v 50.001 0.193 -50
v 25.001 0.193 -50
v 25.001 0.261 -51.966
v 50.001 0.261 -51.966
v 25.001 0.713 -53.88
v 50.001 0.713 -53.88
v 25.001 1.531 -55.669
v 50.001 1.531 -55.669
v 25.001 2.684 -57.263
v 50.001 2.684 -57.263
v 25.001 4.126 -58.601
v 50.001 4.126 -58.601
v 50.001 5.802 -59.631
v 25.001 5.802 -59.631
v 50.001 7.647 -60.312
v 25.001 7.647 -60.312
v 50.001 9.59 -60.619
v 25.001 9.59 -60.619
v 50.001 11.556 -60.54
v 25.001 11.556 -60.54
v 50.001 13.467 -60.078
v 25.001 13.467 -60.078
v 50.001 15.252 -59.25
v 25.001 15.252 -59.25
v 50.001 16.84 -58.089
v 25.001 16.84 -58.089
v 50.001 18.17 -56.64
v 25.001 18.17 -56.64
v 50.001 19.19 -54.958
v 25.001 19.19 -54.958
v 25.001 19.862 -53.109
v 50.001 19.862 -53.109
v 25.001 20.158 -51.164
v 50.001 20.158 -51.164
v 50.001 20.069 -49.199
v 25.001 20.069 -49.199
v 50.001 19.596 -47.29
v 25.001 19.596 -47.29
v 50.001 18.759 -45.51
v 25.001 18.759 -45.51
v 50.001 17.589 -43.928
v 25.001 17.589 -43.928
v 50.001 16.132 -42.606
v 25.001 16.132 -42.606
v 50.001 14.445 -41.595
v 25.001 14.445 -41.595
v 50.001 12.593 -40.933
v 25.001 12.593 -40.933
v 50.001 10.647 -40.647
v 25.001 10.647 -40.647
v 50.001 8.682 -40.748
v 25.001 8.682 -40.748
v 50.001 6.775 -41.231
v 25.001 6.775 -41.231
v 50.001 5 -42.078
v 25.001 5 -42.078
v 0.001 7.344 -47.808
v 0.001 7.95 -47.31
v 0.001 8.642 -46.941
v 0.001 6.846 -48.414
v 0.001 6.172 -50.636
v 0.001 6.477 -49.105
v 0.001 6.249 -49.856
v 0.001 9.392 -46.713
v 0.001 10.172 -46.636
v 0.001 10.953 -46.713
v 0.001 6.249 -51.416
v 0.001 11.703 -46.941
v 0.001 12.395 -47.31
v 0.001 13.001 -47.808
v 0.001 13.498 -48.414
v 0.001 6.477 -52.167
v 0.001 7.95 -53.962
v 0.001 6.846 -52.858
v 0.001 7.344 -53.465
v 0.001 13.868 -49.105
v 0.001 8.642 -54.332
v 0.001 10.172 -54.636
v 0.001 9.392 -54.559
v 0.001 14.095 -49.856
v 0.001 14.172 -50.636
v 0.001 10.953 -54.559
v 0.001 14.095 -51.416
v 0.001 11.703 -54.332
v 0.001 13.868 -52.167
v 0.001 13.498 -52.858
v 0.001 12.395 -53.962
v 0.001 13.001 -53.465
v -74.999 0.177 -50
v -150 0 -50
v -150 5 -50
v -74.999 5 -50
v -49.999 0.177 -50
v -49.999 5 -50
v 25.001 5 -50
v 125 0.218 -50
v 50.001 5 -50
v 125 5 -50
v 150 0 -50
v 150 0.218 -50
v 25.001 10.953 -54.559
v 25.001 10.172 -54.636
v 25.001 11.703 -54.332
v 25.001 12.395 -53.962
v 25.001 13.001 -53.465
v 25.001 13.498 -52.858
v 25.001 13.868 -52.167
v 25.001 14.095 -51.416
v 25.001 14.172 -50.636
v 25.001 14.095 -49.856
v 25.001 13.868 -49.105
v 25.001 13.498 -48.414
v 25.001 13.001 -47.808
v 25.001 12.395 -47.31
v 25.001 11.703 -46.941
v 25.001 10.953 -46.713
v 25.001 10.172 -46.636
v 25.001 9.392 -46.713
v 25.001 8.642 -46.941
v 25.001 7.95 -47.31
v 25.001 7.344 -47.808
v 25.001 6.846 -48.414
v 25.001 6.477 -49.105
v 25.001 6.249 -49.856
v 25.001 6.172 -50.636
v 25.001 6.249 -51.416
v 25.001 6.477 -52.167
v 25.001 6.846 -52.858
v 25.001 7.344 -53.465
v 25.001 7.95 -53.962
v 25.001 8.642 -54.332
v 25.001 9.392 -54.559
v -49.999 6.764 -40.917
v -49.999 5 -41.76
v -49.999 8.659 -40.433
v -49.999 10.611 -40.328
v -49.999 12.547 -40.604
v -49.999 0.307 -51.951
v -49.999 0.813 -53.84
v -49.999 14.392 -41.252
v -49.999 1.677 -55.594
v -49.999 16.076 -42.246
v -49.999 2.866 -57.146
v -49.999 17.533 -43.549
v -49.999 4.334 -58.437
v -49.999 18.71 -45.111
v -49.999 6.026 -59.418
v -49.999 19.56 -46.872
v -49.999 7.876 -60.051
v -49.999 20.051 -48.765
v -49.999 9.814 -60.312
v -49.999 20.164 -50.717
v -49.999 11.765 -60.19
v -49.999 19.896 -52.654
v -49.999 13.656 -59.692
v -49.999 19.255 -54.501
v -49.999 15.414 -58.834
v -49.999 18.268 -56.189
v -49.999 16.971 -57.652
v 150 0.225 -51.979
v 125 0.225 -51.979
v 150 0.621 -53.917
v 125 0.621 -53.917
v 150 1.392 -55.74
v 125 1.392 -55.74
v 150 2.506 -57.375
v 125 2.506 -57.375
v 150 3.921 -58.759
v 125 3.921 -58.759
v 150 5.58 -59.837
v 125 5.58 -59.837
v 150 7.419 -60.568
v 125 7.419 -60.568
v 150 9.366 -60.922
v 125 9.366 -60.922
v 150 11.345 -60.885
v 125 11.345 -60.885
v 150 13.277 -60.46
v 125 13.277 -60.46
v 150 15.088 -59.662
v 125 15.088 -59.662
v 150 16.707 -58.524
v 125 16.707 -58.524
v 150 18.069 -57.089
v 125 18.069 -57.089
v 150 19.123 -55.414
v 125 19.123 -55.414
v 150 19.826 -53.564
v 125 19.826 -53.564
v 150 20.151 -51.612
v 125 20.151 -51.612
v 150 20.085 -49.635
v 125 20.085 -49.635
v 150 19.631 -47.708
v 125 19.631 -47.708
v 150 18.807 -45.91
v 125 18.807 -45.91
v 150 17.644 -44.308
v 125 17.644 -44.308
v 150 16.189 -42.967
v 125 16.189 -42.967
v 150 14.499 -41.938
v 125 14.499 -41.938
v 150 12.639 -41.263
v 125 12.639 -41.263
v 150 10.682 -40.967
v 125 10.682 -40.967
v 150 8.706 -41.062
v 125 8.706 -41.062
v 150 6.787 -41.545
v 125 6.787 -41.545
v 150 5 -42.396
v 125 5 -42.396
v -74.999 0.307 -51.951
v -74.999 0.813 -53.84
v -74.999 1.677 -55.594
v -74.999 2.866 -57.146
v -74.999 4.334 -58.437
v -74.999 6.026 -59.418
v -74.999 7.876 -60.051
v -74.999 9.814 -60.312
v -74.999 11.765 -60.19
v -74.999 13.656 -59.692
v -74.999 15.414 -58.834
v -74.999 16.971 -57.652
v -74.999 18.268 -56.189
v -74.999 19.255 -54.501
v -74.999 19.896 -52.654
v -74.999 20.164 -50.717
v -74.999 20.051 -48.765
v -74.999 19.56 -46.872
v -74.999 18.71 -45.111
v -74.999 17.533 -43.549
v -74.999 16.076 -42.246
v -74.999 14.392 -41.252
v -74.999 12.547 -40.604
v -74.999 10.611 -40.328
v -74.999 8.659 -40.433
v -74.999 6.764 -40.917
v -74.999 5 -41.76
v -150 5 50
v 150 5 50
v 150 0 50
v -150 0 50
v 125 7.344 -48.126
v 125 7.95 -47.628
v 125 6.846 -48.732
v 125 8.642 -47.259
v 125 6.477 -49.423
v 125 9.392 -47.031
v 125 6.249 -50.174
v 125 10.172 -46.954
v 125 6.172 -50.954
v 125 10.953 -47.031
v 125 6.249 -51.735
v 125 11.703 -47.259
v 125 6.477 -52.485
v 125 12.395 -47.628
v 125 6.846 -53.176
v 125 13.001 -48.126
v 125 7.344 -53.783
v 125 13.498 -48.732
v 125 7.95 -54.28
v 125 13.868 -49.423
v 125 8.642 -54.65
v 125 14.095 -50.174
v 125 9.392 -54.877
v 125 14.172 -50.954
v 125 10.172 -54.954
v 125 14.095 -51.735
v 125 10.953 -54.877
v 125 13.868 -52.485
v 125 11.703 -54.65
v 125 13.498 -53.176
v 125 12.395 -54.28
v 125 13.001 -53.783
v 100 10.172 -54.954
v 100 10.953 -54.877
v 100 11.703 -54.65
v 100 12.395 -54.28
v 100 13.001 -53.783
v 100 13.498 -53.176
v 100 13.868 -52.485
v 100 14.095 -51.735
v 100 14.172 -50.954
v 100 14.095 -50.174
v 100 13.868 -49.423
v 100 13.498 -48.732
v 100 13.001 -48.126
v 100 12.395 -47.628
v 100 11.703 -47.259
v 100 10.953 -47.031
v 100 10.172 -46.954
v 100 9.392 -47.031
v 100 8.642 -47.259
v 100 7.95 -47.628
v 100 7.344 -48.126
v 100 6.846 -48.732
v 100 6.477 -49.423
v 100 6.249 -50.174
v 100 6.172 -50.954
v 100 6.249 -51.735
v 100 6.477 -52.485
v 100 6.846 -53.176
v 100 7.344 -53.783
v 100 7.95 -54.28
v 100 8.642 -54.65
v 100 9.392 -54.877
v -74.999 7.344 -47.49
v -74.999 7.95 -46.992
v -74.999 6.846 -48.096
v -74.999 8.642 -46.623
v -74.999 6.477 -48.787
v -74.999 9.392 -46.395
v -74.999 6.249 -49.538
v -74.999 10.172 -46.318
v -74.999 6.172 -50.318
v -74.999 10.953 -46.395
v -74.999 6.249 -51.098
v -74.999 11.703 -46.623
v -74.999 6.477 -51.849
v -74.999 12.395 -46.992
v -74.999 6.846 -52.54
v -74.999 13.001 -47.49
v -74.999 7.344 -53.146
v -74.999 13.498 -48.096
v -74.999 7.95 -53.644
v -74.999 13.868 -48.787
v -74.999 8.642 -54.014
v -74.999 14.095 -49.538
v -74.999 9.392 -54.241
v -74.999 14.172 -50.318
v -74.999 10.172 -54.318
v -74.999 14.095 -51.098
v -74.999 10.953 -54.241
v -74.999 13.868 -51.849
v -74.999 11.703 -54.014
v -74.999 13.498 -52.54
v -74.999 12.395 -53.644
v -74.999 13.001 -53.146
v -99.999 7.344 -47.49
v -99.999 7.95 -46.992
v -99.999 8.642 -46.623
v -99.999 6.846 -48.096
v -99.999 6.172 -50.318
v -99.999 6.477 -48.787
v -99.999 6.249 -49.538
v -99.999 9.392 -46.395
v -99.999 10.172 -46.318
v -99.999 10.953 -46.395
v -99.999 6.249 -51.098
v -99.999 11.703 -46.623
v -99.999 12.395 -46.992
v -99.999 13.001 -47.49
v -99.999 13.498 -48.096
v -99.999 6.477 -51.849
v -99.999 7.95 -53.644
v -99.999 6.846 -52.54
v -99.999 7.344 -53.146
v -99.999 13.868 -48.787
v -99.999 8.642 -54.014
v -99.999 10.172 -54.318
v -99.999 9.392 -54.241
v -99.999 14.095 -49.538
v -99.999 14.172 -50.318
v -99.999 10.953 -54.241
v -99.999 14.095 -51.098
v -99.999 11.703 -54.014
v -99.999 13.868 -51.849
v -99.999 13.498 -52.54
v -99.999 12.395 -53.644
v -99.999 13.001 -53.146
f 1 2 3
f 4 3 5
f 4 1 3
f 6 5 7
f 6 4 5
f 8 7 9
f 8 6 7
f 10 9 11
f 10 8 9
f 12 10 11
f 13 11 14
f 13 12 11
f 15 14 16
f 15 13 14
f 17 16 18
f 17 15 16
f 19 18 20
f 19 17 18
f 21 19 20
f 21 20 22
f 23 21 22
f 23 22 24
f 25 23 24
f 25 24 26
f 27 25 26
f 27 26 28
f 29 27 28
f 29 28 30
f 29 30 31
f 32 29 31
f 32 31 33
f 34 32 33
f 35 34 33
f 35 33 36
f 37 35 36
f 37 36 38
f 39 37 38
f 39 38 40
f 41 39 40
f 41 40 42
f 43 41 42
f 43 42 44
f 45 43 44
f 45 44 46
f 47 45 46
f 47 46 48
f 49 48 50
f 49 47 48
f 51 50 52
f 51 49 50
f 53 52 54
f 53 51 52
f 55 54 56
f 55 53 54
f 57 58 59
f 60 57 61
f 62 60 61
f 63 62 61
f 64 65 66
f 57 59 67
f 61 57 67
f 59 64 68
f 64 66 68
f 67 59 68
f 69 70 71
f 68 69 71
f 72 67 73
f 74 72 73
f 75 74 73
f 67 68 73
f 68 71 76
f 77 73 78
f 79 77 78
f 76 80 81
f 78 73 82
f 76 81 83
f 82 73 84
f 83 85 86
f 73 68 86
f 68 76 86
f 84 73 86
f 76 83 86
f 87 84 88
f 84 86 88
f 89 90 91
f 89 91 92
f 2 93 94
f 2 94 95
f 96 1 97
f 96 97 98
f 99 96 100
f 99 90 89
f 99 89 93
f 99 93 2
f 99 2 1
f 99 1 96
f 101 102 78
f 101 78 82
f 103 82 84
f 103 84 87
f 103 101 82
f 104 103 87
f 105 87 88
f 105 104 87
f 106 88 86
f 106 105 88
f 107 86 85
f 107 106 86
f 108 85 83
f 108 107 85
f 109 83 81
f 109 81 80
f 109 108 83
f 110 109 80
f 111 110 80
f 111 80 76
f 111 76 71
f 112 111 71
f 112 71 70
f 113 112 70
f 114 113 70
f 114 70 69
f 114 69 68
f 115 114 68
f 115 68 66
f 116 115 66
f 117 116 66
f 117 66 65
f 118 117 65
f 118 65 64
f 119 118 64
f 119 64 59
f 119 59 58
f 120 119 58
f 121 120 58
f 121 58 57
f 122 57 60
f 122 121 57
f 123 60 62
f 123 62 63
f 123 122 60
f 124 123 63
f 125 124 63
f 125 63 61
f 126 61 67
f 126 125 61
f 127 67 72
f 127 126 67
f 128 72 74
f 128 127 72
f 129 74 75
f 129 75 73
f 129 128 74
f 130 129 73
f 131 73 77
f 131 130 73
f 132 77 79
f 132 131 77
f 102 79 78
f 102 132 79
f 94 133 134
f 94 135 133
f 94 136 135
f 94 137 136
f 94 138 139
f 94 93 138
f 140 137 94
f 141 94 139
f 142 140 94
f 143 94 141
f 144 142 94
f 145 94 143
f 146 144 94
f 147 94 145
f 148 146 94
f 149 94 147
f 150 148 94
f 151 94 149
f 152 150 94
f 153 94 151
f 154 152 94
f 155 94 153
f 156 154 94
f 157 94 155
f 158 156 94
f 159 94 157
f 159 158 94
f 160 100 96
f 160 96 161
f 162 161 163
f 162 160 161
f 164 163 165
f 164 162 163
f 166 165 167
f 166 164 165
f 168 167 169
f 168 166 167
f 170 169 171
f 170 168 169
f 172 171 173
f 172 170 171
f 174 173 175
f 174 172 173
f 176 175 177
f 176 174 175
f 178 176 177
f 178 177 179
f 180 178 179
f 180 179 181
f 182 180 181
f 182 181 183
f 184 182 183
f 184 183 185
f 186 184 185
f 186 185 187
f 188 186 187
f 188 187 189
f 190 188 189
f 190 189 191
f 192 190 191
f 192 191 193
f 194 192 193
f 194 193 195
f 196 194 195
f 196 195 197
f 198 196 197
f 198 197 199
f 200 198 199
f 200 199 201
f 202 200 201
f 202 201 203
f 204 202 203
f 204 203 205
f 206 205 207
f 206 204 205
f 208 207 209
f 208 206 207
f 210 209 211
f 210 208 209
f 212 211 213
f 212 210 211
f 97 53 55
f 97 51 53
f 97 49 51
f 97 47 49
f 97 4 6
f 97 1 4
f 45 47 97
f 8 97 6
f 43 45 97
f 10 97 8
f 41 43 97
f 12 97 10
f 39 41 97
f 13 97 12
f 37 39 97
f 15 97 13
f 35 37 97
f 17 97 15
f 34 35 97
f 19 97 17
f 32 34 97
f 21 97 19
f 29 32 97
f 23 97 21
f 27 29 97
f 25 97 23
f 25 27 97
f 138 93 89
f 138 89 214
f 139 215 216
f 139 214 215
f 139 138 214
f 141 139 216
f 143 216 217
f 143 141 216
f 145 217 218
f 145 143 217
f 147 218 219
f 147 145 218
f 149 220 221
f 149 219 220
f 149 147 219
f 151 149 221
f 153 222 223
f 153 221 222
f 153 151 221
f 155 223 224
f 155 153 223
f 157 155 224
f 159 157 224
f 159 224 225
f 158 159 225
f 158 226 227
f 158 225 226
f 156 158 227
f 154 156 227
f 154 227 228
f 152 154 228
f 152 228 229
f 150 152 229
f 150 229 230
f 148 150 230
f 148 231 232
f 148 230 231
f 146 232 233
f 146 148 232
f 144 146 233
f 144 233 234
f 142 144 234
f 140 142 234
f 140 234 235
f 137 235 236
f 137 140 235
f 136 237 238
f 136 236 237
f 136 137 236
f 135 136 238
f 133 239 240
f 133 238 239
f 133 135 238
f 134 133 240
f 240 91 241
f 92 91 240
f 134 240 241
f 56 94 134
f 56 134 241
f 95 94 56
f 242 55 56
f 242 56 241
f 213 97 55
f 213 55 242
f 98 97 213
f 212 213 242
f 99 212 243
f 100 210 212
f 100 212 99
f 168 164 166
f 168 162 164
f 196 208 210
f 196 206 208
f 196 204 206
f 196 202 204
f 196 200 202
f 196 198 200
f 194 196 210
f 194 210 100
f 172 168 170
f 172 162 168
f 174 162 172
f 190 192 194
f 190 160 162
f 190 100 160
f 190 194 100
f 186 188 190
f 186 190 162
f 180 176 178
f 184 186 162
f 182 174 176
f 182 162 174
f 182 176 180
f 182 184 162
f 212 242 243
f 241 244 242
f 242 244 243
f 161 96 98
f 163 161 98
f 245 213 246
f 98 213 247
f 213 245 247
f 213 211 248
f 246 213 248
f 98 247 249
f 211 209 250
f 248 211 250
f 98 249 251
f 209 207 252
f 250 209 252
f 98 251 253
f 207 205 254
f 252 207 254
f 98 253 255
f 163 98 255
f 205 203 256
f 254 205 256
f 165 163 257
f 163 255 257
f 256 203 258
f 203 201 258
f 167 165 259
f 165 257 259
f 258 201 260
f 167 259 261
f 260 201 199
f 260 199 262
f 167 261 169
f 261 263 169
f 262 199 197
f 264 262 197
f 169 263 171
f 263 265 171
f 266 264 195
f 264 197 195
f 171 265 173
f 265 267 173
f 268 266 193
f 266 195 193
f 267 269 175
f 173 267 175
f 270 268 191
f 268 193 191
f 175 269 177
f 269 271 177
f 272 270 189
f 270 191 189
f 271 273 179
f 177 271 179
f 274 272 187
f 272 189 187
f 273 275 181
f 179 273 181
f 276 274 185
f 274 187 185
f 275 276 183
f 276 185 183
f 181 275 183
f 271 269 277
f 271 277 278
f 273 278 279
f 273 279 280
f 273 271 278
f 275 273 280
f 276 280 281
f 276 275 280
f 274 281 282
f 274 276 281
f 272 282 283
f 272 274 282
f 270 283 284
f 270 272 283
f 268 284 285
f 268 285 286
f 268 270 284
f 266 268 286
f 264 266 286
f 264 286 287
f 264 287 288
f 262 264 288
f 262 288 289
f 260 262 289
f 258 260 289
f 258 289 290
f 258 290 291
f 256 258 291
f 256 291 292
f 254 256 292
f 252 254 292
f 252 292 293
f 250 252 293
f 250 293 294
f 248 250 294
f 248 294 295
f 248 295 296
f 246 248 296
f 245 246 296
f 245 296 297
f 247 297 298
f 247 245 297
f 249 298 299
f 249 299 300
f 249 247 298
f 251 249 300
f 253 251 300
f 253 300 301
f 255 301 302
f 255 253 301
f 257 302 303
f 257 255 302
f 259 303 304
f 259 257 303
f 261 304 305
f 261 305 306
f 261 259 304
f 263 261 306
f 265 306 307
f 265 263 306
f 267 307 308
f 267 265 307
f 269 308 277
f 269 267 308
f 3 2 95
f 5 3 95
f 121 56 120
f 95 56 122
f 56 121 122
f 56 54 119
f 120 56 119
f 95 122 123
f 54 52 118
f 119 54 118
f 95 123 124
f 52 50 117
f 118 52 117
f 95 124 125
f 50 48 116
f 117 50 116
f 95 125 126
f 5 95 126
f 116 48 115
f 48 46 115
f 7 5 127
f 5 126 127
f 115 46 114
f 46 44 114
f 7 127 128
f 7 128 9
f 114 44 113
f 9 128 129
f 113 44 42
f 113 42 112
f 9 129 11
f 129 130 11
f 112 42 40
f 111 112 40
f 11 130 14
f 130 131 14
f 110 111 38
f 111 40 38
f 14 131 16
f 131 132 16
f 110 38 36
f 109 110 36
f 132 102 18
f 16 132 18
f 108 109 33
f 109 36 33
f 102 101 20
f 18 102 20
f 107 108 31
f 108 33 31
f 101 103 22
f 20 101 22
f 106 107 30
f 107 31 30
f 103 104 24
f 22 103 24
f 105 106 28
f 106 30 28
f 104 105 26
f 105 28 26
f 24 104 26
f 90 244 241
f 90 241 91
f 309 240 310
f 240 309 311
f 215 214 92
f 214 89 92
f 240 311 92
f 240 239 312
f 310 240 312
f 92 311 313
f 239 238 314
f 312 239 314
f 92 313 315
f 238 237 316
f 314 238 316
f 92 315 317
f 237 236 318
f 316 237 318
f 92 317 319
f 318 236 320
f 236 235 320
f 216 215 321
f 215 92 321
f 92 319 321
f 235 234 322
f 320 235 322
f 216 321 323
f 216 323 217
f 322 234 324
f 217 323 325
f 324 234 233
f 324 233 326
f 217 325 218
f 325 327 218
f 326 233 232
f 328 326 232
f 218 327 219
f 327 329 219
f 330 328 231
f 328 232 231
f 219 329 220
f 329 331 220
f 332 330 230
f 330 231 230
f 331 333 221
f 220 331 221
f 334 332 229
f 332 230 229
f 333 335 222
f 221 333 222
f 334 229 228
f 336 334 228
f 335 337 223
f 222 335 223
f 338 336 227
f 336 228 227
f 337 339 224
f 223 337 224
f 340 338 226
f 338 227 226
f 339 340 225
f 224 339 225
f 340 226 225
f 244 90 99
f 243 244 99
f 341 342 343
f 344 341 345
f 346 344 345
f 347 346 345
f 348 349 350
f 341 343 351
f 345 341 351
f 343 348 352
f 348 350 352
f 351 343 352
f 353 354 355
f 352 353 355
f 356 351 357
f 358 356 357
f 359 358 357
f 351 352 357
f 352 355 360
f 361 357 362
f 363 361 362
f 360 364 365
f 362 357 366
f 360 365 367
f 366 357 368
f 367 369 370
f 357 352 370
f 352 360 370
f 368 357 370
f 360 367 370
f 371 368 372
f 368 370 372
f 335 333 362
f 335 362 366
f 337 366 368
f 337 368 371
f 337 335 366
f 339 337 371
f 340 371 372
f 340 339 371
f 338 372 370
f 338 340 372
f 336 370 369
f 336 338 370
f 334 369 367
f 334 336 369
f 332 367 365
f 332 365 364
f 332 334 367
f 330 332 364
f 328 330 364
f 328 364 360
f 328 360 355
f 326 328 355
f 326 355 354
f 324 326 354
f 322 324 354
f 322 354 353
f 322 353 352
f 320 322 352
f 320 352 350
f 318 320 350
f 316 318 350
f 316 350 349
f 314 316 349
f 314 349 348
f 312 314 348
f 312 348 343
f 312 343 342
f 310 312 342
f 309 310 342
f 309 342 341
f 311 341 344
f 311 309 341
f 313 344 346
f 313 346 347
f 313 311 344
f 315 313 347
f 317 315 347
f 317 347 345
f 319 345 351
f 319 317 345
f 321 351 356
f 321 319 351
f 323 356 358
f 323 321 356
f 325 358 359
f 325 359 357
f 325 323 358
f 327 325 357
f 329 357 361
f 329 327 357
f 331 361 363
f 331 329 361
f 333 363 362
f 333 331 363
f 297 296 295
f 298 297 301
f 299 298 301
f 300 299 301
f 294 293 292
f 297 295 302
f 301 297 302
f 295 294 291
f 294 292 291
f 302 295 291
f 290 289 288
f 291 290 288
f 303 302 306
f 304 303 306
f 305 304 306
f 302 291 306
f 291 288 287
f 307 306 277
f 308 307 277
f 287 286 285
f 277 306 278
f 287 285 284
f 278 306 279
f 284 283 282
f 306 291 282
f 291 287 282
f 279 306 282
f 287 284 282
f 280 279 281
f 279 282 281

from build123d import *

# Parameters (mm, degrees)
SKETCH1_W           = 300
SKETCH1_H           = 100
BOSS_EXTRUDE1_DEPTH = 5
SKETCH7_R           = 10
BOSS_EXTRUDE5_DEPTH = 25
SKETCH10_R          = 4
BOSS_EXTRUDE6_DEPTH = 50
LPATTERN1_COUNT     = 3
LPATTERN1_PITCH     = 100


with BuildPart() as part:
    # Sketch1 → Boss-Extrude1 (new body)
    with BuildSketch(Plane(origin=(0, 0, 0), x_dir=(1, 0, 0), z_dir=(0, 1, 0))):
        Rectangle(SKETCH1_W, SKETCH1_H)
    extrude(amount=BOSS_EXTRUDE1_DEPTH)

    # Sketch7 → Boss-Extrude5 (add)
    with BuildSketch(Plane(origin=(150, 0, 0), x_dir=(0, 0, -1), z_dir=(1, 0, 0))):
        with Locations((50.954154719, 10.172311349)):
            Circle(SKETCH7_R)
    boss_extrude5 = extrude(amount=-BOSS_EXTRUDE5_DEPTH)

    # Sketch10 → Boss-Extrude6 (add)
    with BuildSketch(Plane(origin=(150, 0, 0), x_dir=(0, 0, -1), z_dir=(1, 0, 0))):
        with Locations((50.954154719, 10.172311349)):
            Circle(SKETCH10_R)
    boss_extrude6 = extrude(amount=-BOSS_EXTRUDE6_DEPTH)

    # LPattern1: Boss-Extrude5, Boss-Extrude6 ×3
    with Locations(*[Vector(-0.999994942, 0, 0.0031805) * (i * LPATTERN1_PITCH) for i in range(1, LPATTERN1_COUNT)]):
        add(boss_extrude5)
        add(boss_extrude6)


solid = part.part
